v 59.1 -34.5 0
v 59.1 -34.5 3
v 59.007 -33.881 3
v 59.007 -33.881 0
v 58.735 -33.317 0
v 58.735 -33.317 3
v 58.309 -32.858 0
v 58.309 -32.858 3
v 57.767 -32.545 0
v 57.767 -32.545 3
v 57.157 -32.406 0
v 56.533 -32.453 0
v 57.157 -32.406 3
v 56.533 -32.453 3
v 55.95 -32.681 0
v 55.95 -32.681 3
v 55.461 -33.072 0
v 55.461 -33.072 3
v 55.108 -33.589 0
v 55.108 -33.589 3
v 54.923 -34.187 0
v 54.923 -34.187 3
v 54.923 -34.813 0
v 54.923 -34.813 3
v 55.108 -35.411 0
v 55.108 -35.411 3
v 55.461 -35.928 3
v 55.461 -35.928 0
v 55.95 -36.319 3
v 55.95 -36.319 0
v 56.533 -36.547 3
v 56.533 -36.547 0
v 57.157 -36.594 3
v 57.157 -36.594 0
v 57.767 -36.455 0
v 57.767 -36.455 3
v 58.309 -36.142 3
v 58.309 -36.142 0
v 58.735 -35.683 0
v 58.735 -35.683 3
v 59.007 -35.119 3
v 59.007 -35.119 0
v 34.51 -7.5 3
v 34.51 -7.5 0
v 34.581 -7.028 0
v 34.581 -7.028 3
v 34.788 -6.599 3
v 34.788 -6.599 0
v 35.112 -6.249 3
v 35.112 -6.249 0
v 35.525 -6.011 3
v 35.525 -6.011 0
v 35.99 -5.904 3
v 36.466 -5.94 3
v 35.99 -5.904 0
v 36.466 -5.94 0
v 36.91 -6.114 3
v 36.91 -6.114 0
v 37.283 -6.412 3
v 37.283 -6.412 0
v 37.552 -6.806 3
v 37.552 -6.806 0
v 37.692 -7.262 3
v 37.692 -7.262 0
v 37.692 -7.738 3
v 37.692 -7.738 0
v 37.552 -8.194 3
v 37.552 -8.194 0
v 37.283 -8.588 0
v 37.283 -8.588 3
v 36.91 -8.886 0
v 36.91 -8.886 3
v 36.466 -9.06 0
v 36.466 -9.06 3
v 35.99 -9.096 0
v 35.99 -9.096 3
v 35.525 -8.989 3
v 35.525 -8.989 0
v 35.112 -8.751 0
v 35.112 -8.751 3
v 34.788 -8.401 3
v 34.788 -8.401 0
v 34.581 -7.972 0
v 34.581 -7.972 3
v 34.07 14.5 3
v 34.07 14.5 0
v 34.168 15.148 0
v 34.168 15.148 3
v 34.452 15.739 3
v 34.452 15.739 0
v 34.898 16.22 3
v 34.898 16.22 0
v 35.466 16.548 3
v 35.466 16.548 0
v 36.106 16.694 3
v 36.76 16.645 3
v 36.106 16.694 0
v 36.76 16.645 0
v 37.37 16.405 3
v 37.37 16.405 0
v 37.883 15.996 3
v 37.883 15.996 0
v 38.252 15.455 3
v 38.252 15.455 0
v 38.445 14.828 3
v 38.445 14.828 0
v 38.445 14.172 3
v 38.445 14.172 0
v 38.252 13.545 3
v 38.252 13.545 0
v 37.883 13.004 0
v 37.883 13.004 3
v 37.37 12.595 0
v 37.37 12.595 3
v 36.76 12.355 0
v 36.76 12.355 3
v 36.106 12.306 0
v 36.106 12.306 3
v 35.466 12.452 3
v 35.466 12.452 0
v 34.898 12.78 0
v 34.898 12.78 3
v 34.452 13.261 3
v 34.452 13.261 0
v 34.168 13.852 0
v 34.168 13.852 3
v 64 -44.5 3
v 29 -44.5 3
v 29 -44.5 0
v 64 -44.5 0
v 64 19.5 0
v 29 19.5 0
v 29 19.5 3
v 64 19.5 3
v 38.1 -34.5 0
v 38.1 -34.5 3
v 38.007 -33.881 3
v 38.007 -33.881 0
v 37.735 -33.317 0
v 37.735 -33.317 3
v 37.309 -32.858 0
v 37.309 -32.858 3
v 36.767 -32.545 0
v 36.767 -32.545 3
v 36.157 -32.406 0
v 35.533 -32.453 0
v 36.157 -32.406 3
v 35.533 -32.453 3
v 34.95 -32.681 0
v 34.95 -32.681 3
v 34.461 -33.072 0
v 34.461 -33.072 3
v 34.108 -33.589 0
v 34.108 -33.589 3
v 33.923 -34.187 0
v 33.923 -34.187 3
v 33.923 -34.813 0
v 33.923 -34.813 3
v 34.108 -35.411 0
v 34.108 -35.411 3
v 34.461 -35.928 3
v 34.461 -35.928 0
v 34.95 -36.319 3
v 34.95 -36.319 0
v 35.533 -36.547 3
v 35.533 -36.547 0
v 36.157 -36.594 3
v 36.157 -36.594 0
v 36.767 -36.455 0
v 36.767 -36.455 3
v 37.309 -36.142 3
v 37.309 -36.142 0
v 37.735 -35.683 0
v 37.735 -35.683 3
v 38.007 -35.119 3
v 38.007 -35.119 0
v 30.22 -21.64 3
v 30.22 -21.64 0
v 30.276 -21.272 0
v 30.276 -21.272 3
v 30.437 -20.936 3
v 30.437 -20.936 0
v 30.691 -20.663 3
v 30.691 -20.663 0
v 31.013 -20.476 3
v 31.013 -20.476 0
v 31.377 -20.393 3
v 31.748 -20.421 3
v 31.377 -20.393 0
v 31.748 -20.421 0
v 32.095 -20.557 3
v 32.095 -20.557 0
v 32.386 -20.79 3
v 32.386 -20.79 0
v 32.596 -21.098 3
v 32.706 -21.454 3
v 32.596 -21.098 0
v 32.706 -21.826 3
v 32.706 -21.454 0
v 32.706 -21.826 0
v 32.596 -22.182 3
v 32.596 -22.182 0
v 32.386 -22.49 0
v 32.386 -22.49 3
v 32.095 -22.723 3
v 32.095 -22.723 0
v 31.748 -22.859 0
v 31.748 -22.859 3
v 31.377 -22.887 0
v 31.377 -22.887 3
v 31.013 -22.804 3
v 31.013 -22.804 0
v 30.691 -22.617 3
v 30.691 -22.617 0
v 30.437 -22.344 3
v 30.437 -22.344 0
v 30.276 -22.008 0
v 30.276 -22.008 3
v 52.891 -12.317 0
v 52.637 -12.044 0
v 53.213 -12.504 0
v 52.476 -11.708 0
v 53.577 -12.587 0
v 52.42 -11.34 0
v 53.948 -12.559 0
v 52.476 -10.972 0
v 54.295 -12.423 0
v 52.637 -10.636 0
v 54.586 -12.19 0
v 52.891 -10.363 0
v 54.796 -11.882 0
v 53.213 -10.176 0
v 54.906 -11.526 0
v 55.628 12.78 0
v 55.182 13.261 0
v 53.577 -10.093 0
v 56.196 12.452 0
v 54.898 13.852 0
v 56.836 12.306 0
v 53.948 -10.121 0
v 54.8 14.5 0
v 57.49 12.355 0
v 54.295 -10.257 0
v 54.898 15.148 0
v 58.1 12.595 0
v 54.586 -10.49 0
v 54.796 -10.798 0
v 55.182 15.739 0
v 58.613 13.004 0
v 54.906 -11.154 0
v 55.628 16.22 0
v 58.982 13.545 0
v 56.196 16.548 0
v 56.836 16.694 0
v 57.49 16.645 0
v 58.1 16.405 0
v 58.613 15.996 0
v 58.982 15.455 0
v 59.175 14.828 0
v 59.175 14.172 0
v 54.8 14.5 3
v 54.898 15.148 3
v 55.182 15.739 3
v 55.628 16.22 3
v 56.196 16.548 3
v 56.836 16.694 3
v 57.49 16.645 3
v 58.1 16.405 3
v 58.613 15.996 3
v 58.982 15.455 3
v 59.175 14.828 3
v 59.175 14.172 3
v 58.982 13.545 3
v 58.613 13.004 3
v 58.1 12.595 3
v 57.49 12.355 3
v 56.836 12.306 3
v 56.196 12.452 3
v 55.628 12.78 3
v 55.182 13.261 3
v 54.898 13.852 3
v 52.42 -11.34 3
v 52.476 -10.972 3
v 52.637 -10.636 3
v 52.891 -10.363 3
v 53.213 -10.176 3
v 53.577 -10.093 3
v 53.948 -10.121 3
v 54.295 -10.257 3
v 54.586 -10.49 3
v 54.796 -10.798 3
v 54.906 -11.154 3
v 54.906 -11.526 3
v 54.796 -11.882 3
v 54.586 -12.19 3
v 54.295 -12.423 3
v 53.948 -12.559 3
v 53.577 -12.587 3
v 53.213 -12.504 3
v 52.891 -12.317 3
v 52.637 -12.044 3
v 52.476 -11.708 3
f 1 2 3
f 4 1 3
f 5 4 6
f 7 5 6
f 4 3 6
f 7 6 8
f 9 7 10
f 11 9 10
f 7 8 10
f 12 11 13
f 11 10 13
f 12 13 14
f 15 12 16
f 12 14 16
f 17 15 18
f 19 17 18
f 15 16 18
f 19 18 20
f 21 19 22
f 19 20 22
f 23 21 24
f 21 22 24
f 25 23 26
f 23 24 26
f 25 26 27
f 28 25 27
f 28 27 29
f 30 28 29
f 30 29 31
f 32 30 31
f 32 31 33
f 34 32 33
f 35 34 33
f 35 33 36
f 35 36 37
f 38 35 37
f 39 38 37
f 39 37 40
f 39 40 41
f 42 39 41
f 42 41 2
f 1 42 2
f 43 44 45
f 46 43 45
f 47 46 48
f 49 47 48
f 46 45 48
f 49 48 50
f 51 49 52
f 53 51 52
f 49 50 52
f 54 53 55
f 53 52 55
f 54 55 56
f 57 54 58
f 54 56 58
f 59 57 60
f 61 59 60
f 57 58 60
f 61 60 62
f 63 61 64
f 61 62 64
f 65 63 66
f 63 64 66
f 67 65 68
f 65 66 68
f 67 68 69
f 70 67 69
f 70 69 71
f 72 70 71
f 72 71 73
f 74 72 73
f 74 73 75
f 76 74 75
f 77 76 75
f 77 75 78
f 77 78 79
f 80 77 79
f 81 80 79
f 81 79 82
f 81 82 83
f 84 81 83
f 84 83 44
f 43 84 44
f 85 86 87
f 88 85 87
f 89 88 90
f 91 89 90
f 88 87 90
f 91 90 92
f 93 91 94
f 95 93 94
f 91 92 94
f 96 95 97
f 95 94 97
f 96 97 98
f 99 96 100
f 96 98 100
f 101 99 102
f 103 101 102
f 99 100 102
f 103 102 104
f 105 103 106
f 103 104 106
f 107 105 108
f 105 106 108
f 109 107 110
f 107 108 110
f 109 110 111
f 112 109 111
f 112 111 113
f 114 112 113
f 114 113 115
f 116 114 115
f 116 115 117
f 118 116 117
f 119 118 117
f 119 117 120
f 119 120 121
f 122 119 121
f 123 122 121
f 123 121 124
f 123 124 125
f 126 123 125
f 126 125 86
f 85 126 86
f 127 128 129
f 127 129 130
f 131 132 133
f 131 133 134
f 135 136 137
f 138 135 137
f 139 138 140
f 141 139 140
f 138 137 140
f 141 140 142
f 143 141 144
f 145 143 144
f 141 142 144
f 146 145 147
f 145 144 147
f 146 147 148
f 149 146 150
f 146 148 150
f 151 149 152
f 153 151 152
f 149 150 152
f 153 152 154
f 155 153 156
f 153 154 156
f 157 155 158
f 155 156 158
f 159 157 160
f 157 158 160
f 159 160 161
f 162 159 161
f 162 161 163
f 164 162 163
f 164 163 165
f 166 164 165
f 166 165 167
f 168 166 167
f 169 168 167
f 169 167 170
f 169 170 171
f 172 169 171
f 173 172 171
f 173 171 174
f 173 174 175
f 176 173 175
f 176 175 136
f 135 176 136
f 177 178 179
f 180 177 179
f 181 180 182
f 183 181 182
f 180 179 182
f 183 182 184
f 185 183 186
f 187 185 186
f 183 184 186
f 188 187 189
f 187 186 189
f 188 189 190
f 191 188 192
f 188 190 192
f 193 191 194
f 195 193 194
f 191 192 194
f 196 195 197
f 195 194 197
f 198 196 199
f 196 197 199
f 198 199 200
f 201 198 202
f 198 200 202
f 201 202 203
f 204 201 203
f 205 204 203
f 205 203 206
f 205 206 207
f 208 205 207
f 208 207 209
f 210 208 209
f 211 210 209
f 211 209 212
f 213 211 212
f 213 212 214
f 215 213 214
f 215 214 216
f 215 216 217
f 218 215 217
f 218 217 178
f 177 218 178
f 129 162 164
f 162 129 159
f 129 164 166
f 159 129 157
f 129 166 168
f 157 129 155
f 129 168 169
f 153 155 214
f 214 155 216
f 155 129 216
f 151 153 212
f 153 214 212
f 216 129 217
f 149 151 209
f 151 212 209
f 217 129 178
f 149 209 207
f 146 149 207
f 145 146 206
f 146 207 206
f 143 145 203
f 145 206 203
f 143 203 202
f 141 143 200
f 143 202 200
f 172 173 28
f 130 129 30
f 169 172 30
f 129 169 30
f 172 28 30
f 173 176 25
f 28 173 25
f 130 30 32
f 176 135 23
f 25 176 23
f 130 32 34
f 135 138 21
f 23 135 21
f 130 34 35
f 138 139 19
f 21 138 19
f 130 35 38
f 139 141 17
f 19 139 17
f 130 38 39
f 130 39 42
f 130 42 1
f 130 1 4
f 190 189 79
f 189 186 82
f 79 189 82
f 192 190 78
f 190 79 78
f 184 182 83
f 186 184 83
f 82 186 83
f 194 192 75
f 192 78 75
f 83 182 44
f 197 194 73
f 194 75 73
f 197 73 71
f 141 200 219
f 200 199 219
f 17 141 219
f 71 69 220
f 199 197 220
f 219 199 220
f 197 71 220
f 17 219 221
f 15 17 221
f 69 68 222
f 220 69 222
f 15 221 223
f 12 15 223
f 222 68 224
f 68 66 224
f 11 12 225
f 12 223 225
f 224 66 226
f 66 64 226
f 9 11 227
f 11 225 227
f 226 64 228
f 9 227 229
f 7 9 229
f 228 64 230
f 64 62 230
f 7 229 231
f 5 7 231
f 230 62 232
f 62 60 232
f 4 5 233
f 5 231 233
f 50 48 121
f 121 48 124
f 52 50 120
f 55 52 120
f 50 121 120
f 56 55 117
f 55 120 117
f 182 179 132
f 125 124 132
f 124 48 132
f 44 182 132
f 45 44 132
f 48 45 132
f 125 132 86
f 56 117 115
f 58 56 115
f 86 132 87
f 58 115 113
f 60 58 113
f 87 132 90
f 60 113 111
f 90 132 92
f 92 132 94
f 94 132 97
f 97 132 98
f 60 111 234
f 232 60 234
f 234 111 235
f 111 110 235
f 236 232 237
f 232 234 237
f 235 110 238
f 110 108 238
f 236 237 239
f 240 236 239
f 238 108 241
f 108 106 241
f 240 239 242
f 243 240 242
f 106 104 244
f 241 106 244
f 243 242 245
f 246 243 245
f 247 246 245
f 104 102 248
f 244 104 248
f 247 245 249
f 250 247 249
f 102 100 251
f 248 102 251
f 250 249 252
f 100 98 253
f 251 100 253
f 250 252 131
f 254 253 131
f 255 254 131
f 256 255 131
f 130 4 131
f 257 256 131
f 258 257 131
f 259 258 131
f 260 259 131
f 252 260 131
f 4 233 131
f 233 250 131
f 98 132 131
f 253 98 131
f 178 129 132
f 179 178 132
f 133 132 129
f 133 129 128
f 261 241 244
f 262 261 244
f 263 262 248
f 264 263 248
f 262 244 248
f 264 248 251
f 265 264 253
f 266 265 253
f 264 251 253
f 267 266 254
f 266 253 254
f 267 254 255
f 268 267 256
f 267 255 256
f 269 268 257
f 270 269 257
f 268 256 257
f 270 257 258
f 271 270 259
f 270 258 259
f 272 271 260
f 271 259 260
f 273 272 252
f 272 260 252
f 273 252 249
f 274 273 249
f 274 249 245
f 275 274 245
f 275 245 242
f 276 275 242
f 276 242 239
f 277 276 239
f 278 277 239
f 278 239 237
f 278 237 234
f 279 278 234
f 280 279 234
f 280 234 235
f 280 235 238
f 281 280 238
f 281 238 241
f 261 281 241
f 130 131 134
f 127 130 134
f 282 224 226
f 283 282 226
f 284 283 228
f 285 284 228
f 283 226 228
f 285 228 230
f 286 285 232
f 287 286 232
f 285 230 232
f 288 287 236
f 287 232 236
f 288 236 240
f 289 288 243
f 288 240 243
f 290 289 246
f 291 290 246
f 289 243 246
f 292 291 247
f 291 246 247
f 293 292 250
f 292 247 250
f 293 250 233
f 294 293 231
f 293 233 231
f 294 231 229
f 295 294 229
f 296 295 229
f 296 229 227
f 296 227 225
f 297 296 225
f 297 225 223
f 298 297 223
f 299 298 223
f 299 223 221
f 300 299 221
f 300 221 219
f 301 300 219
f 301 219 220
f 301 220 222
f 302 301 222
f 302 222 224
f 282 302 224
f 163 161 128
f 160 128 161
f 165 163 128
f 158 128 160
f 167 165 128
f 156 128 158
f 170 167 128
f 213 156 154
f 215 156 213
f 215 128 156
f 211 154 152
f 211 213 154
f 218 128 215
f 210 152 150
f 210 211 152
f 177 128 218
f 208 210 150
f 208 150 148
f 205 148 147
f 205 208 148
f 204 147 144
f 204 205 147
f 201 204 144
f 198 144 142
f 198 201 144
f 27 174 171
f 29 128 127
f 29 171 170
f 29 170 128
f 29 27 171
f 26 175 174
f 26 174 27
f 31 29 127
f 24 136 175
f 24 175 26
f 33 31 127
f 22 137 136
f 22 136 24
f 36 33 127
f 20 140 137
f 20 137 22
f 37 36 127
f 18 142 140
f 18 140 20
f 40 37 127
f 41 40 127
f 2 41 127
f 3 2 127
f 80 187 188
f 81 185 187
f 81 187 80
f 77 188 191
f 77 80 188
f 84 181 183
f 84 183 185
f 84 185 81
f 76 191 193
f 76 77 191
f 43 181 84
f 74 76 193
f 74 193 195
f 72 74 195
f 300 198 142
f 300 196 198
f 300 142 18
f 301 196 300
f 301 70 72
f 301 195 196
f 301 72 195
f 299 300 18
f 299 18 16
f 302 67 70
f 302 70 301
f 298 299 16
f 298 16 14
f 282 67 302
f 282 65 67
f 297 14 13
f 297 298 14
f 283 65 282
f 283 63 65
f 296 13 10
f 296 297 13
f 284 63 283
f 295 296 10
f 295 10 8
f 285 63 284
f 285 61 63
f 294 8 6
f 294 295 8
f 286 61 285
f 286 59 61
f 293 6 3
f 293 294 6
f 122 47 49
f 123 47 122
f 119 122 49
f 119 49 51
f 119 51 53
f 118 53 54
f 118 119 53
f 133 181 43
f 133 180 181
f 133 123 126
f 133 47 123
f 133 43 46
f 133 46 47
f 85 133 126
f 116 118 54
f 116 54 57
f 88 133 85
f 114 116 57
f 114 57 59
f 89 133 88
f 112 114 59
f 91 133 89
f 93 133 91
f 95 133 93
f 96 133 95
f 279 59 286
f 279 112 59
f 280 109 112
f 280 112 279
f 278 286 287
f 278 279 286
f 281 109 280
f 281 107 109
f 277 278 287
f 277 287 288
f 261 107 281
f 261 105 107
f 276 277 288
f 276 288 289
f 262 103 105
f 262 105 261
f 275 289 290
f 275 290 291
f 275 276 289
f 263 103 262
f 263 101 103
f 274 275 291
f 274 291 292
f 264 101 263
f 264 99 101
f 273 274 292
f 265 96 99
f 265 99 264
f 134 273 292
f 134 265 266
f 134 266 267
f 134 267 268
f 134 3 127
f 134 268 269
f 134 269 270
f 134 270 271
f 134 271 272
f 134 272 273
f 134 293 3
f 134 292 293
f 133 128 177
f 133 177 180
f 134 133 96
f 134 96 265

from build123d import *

# Parameters (mm, degrees)
SKETCH_1_W           = 40
SKETCH_1_H           = 29
EXTRUDE_1_DEPTH      = 3
CUT_EXTRUDE_1_DEPTH  = 3
SKETCH_3_W           = 40
SKETCH_3_H           = 3
EXTRUDE_2_DEPTH      = 10
SKETCH_4_W           = 40
SKETCH_4_H           = 3
EXTRUDE_3_DEPTH      = 10
SKETCH_6_W           = 3
SKETCH_6_H           = 49
EXTRUDE_5_DEPTH      = 42
SKETCH_8_W           = 3
SKETCH_8_H           = 49
EXTRUDE_6_DEPTH      = 2
SKETCH_9_W           = 3
SKETCH_9_H           = 49
EXTRUDE_7_DEPTH      = 2
SKETCH_10_W          = 86
SKETCH_10_H          = 3
EXTRUDE_8_DEPTH      = 10
SKETCH_11_W          = 86
SKETCH_11_H          = 3
EXTRUDE_9_DEPTH      = 10
SKETCH_14_W          = 3
SKETCH_14_H          = 69
CUT_EXTRUDE_5_DEPTH  = 43
SKETCH_17_W          = 43
SKETCH_17_H          = 3
EXTRUDE_10_DEPTH     = 20
SKETCH_18_R          = 2.1
CUT_EXTRUDE_6_DEPTH  = 10
SKETCH_20_W          = 43
SKETCH_20_H          = 3
EXTRUDE_11_DEPTH     = 10
SKETCH_21_W          = 43
SKETCH_21_H          = 3
CUT_EXTRUDE_7_DEPTH  = 20
SKETCH_24_R          = 2.2
CUT_EXTRUDE_8_DEPTH  = 30
SKETCH_27_R          = 1.6
CUT_EXTRUDE_9_DEPTH  = 10
SKETCH_28_W          = 3
SKETCH_28_H          = 79
CUT_EXTRUDE_10_DEPTH = 8
SKETCH_29_W          = 35
SKETCH_29_H          = 3
CUT_EXTRUDE_11_DEPTH = 15
M3X0_5_2_D           = 2.5
M3X0_5_2_DEPTH       = 8.5
M3X0_5_2_TIP         = 0.751075774


with BuildPart() as part:
    # ｽｹｯﾁ1 → ﾎﾞｽ - 押し出し1 (new body)
    with BuildSketch(Plane.XY):
        Rectangle(SKETCH_1_W, SKETCH_1_H)
    extrude(amount=EXTRUDE_1_DEPTH)

    # ｽｹｯﾁ2 → ｶｯﾄ - 押し出し1 (cut)
    with BuildSketch(Plane.XY.offset(3)):
        with BuildLine():
            ThreePointArc((-14.4, 10.5), (-15.01507576, 11.98492424), (-16.5, 12.6))
            Line((-16.5, 12.6), (-16.5, 10.5))
            Line((-16.5, 10.5), (-18.6, 10.5))
            ThreePointArc((-18.6, 10.5), (-16.5, 8.4), (-14.4, 10.5))
        make_face()
        with BuildLine():
            Line((-16.5, 10.5), (-16.5, 12.6))
            ThreePointArc((-16.5, 12.6), (-17.98492424, 11.98492424), (-18.6, 10.5))
            Line((-18.6, 10.5), (-16.5, 10.5))
        make_face()
        with BuildLine():
            ThreePointArc((-18.6, -10.5), (-17.98492424, -11.98492424), (-16.5, -12.6))
            Line((-16.5, -12.6), (-16.5, -10.5))
            Line((-16.5, -10.5), (-18.6, -10.5))
        make_face()
        with BuildLine():
            Line((-16.5, -10.5), (-16.5, -12.6))
            ThreePointArc((-16.5, -12.6), (-15.01507576, -11.98492424), (-14.4, -10.5))
            ThreePointArc((-14.4, -10.5), (-16.5, -8.4), (-18.6, -10.5))
            Line((-18.6, -10.5), (-16.5, -10.5))
        make_face()
        with BuildLine():
            ThreePointArc((18.6, -10.5), (15.01507576, -9.01507576), (16.5, -12.6))
            Line((16.5, -12.6), (16.5, -10.5))
            Line((16.5, -10.5), (18.6, -10.5))
        make_face()
        with BuildLine():
            Line((16.5, -10.5), (16.5, -12.6))
            ThreePointArc((16.5, -12.6), (17.98492424, -11.98492424), (18.6, -10.5))
            Line((18.6, -10.5), (16.5, -10.5))
        make_face()
        with BuildLine():
            ThreePointArc((18.6, 10.5), (17.98492424, 11.98492424), (16.5, 12.6))
            Line((16.5, 12.6), (16.5, 10.5))
            Line((16.5, 10.5), (18.6, 10.5))
        make_face()
        with BuildLine():
            Line((16.5, 10.5), (16.5, 12.6))
            ThreePointArc((16.5, 12.6), (15.01507576, 9.01507576), (18.6, 10.5))
            Line((18.6, 10.5), (16.5, 10.5))
        make_face()
    extrude(amount=-CUT_EXTRUDE_1_DEPTH, mode=Mode.SUBTRACT)

    # ｽｹｯﾁ3 → ﾎﾞｽ - 押し出し2 (add)
    with BuildSketch(Plane.XZ.offset(14.5)):
        with Locations((0, 1.5)):
            Rectangle(SKETCH_3_W, SKETCH_3_H)
    extrude(amount=EXTRUDE_2_DEPTH)

    # ｽｹｯﾁ4 → ﾎﾞｽ - 押し出し3 (add)
    with BuildSketch(Plane(origin=(0, 14.5, 0), x_dir=(1, 0, 0), z_dir=(0, 1, 0))):
        with Locations((0, -1.5)):
            Rectangle(SKETCH_4_W, SKETCH_4_H)
    extrude(amount=EXTRUDE_3_DEPTH)

    # ｽｹｯﾁ6 → ﾎﾞｽ - 押し出し5 (add)
    with BuildSketch(Plane(origin=(20, 0, 0), x_dir=(0, 0, -1), z_dir=(1, 0, 0))):
        with Locations((-1.5, 0)):
            Rectangle(SKETCH_6_W, SKETCH_6_H)
    extrude(amount=EXTRUDE_5_DEPTH)

    # ｽｹｯﾁ8 → ﾎﾞｽ - 押し出し6 (add)
    with BuildSketch(Plane.ZY.offset(20)):
        with Locations((1.5, 0)):
            Rectangle(SKETCH_8_W, SKETCH_8_H)
    extrude(amount=EXTRUDE_6_DEPTH)

    # ｽｹｯﾁ9 → ﾎﾞｽ - 押し出し7 (add)
    with BuildSketch(Plane(origin=(62, 0, 0), x_dir=(0, 0, -1), z_dir=(1, 0, 0))):
        with Locations((-1.5, 0)):
            Rectangle(SKETCH_9_W, SKETCH_9_H)
    extrude(amount=EXTRUDE_7_DEPTH)

    # ｽｹｯﾁ10 → ﾎﾞｽ - 押し出し8 (add)
    with BuildSketch(Plane.XZ.offset(24.5)):
        with Locations((21, 1.5)):
            Rectangle(SKETCH_10_W, SKETCH_10_H)
    extrude(amount=EXTRUDE_8_DEPTH)

    # ｽｹｯﾁ11 → ﾎﾞｽ - 押し出し9 (add)
    with BuildSketch(Plane(origin=(0, 24.5, 0), x_dir=(1, 0, 0), z_dir=(0, 1, 0))):
        with Locations((21, -1.5)):
            Rectangle(SKETCH_11_W, SKETCH_11_H)
    extrude(amount=EXTRUDE_9_DEPTH)

    # ｽｹｯﾁ14 → ｶｯﾄ - 押し出し5 (cut)
    with BuildSketch(Plane.ZY.offset(22)):
        with Locations((1.5, 0)):
            Rectangle(SKETCH_14_W, SKETCH_14_H)
    extrude(amount=-CUT_EXTRUDE_5_DEPTH, mode=Mode.SUBTRACT)

    # ｽｹｯﾁ17 → ﾎﾞｽ - 押し出し10 (add)
    with BuildSketch(Plane.XZ.offset(34.5)):
        with Locations((42.5, 1.5)):
            Rectangle(SKETCH_17_W, SKETCH_17_H)
    extrude(amount=EXTRUDE_10_DEPTH)

    # ｽｹｯﾁ18 → ｶｯﾄ - 押し出し6 (cut)
    with BuildSketch(Plane.XY.offset(3)):
        with Locations((36, -34.5)):
            Circle(SKETCH_18_R)
        with Locations((57, -34.5)):
            Circle(SKETCH_18_R)
    extrude(amount=-CUT_EXTRUDE_6_DEPTH, mode=Mode.SUBTRACT)

    # ｽｹｯﾁ20 → ﾎﾞｽ - 押し出し11 (add)
    with BuildSketch(Plane.XZ.offset(54.5)):
        with Locations((42.5, 1.5)):
            Rectangle(SKETCH_20_W, SKETCH_20_H)
    extrude(amount=EXTRUDE_11_DEPTH)

    # ｽｹｯﾁ21 → ｶｯﾄ - 押し出し7 (cut)
    with BuildSketch(Plane.XZ.offset(64.5)):
        with Locations((42.5, 1.5)):
            Rectangle(SKETCH_21_W, SKETCH_21_H)
    extrude(amount=-CUT_EXTRUDE_7_DEPTH, mode=Mode.SUBTRACT)

    # ｽｹｯﾁ24 → ｶｯﾄ - 押し出し8 (cut)
    with BuildSketch(Plane(origin=(0, 0, 0), x_dir=(-1, 0, 0), z_dir=(0, 0, -1))):
        with Locations((-36.27, 14.5)):
            Circle(SKETCH_24_R)
        with Locations((-57, 14.5)):
            Circle(SKETCH_24_R)
    extrude(amount=-CUT_EXTRUDE_8_DEPTH, mode=Mode.SUBTRACT)

    # ｽｹｯﾁ27 → ｶｯﾄ - 押し出し9 (cut)
    with BuildSketch(Plane(origin=(0, 0, 0), x_dir=(-1, 0, 0), z_dir=(0, 0, -1))):
        with Locations((-36.11, -7.5)):
            Circle(SKETCH_27_R)
    extrude(amount=-CUT_EXTRUDE_9_DEPTH, mode=Mode.SUBTRACT)

    # ｽｹｯﾁ28 → ｶｯﾄ - 押し出し10 (cut)
    with BuildSketch(Plane.ZY.offset(-21)):
        with Locations((1.5, -5)):
            Rectangle(SKETCH_28_W, SKETCH_28_H)
    extrude(amount=-CUT_EXTRUDE_10_DEPTH, mode=Mode.SUBTRACT)

    # ｽｹｯﾁ29 → ｶｯﾄ - 押し出し11 (cut)
    with BuildSketch(Plane(origin=(0, 34.5, 0), x_dir=(1, 0, 0), z_dir=(0, 1, 0))):
        with Locations((46.5, -1.5)):
            Rectangle(SKETCH_29_W, SKETCH_29_H)
    extrude(amount=-CUT_EXTRUDE_11_DEPTH, mode=Mode.SUBTRACT)

    # M3x0.5 ねじ穴2
    with Locations(Plane(origin=(31.47, -21.64, 3), x_dir=(1, 0, 0), z_dir=(0, 0, 1))):
        with Locations((0, 0), (22.2, 10.3)):
            Hole(M3X0_5_2_D / 2, depth=M3X0_5_2_DEPTH)
            with Locations((0, 0, -(M3X0_5_2_DEPTH + M3X0_5_2_TIP / 2))):  # 118° drill point
                Cone(0, M3X0_5_2_D / 2, M3X0_5_2_TIP, mode=Mode.SUBTRACT)


solid = part.part
